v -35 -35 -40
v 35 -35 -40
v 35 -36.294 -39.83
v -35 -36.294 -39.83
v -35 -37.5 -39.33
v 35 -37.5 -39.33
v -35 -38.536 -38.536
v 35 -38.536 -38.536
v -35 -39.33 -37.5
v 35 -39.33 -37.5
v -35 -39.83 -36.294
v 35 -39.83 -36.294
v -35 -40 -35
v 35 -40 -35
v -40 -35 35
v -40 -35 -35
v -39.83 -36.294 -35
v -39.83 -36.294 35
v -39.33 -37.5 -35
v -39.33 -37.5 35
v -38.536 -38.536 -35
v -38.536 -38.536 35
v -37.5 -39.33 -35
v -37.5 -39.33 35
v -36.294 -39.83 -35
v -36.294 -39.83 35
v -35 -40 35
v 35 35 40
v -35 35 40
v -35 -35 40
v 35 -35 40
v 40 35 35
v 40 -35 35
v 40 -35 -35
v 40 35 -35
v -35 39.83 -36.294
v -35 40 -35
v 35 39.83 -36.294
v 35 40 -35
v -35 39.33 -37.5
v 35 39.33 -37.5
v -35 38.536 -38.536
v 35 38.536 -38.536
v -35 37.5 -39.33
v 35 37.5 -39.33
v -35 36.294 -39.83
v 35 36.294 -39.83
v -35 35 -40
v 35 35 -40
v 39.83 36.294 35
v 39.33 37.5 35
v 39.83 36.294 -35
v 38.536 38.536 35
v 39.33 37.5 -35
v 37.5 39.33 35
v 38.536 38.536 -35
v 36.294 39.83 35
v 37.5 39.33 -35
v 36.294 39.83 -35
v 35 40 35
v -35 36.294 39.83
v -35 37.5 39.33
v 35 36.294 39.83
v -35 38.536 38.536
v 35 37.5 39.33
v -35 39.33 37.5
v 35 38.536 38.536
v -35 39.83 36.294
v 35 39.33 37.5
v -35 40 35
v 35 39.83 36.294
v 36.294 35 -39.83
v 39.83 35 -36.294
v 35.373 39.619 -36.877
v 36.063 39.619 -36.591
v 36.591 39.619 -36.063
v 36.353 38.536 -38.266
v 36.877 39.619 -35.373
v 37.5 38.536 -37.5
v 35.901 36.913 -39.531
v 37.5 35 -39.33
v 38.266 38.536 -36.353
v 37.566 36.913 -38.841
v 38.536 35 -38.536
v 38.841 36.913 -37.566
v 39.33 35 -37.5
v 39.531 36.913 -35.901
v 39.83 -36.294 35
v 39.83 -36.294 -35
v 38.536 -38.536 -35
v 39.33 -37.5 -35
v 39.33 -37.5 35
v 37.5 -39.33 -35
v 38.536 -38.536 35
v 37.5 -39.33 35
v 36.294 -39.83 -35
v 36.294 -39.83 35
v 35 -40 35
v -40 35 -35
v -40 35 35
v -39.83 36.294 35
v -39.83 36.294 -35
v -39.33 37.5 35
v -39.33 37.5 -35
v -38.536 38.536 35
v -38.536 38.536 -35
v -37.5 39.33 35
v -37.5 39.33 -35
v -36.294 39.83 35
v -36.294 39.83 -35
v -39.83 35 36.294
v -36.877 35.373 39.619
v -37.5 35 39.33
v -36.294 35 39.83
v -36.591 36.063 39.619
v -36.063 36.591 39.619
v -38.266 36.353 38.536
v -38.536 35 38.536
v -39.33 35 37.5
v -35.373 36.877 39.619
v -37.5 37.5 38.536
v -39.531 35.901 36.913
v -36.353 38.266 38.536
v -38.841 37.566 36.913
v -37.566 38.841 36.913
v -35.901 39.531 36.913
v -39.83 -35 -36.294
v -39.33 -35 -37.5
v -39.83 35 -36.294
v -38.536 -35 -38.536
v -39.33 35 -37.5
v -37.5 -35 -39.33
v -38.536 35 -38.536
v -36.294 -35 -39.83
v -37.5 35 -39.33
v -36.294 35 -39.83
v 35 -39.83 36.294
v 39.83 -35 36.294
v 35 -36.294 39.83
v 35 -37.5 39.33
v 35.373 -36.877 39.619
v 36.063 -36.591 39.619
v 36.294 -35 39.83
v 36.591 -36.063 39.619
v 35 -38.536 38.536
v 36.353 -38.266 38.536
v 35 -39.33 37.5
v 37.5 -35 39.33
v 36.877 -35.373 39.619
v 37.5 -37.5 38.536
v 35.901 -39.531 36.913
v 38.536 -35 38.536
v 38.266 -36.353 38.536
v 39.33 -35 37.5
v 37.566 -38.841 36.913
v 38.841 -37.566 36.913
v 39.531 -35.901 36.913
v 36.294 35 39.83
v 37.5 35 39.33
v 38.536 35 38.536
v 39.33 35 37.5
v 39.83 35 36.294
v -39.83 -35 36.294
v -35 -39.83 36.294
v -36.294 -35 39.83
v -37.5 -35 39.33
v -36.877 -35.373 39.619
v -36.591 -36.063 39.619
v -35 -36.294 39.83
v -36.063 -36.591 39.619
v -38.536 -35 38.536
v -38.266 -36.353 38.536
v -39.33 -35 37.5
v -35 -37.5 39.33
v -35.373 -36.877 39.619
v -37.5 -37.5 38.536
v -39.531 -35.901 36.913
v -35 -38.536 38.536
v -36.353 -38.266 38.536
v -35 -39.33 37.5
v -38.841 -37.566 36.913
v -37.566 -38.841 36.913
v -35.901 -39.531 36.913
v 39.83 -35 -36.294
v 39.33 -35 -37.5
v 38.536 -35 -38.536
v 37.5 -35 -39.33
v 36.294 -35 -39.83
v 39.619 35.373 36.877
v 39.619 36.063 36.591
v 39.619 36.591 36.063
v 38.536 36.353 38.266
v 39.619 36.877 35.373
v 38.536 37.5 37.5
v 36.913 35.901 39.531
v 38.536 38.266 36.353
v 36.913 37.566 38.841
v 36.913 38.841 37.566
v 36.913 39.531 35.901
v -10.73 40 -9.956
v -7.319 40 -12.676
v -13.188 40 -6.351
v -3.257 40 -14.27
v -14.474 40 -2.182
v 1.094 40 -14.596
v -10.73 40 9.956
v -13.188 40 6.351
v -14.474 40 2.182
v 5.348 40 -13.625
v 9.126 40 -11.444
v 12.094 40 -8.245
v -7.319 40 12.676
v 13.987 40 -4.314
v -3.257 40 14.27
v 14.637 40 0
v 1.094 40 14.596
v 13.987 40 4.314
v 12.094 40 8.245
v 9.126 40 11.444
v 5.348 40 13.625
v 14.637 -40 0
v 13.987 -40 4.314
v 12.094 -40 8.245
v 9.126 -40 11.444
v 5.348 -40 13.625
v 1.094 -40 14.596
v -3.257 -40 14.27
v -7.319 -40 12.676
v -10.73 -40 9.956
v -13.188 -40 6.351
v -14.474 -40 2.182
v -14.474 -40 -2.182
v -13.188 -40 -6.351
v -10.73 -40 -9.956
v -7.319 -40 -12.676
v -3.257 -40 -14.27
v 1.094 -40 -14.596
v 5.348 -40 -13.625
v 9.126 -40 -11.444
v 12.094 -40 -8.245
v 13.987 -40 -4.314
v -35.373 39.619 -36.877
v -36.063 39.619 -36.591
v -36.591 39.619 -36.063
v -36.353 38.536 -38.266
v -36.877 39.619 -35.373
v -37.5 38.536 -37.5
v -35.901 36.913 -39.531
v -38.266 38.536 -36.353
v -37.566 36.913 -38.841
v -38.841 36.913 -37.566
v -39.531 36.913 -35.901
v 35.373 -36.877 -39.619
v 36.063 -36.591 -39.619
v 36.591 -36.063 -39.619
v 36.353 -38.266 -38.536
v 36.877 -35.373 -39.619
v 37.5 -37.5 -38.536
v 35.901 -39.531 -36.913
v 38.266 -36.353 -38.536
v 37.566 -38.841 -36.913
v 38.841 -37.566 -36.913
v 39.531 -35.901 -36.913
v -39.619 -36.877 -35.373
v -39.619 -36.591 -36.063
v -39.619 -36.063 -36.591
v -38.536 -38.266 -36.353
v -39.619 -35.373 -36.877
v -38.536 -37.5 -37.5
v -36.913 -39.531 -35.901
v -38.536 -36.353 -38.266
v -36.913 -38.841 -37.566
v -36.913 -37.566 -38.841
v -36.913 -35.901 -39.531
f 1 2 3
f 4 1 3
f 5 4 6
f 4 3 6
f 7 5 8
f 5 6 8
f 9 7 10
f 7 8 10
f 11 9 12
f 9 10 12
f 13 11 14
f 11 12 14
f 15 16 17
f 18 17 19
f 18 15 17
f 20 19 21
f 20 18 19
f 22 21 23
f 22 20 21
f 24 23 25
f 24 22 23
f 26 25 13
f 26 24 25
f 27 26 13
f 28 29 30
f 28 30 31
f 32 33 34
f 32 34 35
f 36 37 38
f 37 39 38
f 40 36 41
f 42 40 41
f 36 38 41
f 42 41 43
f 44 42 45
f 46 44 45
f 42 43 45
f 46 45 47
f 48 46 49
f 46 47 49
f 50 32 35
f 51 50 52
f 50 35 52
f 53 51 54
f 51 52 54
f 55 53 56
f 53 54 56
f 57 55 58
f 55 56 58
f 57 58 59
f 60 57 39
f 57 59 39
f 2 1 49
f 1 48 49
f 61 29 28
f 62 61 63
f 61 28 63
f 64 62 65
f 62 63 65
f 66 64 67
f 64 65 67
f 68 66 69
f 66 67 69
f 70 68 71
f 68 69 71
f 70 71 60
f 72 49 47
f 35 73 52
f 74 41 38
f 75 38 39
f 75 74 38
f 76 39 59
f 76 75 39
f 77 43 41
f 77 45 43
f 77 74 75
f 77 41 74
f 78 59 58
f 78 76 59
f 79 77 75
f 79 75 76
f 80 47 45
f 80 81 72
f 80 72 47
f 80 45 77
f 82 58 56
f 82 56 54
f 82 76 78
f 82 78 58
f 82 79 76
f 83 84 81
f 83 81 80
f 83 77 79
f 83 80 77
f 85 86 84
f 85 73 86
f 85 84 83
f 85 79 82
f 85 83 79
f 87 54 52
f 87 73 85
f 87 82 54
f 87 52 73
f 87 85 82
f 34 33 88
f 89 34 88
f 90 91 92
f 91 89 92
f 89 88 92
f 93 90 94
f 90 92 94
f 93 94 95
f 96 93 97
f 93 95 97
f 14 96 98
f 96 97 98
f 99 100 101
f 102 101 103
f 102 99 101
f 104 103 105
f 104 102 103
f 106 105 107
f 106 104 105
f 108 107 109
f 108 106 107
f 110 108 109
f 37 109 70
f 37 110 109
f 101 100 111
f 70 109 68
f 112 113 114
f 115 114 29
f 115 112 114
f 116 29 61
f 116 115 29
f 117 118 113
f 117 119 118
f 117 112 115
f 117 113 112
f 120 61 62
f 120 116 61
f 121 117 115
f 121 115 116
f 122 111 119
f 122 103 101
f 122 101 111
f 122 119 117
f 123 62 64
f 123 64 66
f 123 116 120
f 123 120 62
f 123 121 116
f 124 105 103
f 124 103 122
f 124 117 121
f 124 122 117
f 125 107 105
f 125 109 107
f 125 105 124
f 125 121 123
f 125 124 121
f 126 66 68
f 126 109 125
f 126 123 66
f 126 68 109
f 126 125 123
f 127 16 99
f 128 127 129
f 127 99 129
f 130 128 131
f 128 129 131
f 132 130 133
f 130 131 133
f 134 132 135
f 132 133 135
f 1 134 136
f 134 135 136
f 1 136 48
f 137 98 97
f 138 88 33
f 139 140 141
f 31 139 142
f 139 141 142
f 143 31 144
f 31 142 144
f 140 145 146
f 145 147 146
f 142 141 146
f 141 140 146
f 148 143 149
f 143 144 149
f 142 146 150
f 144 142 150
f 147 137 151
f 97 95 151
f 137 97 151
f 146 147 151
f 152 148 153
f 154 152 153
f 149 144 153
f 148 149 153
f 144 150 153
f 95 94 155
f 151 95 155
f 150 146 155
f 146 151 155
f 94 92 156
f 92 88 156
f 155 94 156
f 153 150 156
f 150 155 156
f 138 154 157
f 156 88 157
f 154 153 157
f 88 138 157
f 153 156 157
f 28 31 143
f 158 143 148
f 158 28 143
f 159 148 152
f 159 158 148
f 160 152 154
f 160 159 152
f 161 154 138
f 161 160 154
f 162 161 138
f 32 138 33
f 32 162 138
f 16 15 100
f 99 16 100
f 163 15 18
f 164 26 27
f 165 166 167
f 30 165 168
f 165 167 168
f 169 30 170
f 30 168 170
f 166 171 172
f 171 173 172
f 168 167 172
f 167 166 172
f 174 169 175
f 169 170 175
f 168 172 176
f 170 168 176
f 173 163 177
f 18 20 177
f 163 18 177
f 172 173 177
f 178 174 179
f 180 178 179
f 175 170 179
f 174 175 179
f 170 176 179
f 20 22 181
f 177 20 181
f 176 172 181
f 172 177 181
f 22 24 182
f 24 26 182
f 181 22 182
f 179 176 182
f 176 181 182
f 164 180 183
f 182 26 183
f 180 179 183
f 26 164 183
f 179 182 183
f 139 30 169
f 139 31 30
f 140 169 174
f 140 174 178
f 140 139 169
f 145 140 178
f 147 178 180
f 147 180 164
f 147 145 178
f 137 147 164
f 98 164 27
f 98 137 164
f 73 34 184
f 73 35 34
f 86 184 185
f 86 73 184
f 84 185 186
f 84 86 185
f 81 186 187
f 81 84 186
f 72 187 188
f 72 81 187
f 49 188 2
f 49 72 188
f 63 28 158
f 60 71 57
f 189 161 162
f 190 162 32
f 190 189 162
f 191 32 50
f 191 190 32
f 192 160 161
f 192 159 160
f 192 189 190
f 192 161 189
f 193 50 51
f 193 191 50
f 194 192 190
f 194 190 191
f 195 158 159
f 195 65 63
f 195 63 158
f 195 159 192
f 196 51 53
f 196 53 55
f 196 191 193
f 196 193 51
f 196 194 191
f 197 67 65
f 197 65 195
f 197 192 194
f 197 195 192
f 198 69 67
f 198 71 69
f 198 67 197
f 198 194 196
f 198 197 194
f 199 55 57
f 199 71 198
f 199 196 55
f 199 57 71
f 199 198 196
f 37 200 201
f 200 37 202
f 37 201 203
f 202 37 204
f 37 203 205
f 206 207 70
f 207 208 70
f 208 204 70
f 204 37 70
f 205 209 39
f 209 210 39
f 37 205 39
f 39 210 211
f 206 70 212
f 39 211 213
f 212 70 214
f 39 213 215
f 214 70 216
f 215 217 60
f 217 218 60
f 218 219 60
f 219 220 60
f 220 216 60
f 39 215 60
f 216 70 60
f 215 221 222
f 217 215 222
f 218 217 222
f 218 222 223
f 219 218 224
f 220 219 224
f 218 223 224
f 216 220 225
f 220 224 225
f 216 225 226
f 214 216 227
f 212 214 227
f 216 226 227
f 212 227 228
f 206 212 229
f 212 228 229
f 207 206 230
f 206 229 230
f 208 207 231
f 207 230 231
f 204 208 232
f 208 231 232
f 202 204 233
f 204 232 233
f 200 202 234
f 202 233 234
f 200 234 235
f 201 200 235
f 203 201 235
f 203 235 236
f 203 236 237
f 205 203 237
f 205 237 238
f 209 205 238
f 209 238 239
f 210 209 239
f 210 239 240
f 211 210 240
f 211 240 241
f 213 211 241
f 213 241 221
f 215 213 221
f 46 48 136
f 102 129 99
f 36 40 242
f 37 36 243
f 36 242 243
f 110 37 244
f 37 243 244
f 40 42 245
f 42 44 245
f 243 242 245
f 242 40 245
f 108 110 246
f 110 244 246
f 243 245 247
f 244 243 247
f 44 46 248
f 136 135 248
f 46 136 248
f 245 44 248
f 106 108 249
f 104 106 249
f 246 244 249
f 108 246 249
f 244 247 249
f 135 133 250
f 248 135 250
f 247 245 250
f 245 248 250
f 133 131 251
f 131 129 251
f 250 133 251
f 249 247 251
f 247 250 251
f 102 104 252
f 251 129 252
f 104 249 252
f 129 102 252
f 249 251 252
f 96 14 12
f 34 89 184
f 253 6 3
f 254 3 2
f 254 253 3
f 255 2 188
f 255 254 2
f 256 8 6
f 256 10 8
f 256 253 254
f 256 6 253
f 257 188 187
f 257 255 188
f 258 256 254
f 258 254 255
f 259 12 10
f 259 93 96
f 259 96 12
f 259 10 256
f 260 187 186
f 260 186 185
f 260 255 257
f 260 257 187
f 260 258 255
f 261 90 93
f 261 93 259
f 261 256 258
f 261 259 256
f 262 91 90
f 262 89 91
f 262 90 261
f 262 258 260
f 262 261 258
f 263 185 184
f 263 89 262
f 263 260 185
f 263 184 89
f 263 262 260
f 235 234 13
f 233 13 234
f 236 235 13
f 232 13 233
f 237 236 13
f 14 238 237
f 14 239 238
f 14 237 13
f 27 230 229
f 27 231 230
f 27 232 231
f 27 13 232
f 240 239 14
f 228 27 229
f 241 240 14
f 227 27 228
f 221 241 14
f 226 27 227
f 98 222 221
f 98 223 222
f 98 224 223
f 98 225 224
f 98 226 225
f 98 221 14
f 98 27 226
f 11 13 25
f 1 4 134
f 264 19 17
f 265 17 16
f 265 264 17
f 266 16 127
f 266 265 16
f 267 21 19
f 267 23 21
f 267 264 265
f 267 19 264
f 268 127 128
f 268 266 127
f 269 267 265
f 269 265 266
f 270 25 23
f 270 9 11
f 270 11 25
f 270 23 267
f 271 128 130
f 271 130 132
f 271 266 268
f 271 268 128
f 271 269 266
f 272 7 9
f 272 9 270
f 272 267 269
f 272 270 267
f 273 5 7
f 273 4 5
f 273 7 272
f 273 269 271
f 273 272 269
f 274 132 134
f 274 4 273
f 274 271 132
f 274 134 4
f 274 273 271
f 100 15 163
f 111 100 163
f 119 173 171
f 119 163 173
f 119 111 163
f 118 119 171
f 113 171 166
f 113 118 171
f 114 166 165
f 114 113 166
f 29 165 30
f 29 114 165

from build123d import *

# Parameters (mm, degrees)
F0_W     = 80
F0_H     = 80
F1_DEPTH = 40
F2_R     = 5
F3_R     = 14.637142
F4_DEPTH = 80.001


with BuildPart() as f1:
    # F0 (on Top) → F1 (new body, symmetric)
    with BuildSketch(Plane.XY):
        Rectangle(F0_W, F0_H)
    extrude(amount=F1_DEPTH, both=True)

    # F2
    f2_edges = [f1.edges().sort_by_distance(p)[0] for p in [
        (40, -40, 0),
        (0, -40, -40),
        (-40, -40, 0),
        (-40, 0, -40),
        (40, 0, -40),
        (0, 40, -40),
        (-40, 40, 0),
        (-40, 0, 40),
        (0, -40, 40),
        (0, 40, 40),
        (40, 0, 40),
        (40, 40, 0),
    ]]
    fillet(f2_edges, radius=F2_R)

    # F3 (on face) → F4 (cut, through all)
    with BuildSketch(Plane.XZ.offset(40)):
        Circle(F3_R)
    extrude(amount=-F4_DEPTH, mode=Mode.SUBTRACT)


solid = f1.part
